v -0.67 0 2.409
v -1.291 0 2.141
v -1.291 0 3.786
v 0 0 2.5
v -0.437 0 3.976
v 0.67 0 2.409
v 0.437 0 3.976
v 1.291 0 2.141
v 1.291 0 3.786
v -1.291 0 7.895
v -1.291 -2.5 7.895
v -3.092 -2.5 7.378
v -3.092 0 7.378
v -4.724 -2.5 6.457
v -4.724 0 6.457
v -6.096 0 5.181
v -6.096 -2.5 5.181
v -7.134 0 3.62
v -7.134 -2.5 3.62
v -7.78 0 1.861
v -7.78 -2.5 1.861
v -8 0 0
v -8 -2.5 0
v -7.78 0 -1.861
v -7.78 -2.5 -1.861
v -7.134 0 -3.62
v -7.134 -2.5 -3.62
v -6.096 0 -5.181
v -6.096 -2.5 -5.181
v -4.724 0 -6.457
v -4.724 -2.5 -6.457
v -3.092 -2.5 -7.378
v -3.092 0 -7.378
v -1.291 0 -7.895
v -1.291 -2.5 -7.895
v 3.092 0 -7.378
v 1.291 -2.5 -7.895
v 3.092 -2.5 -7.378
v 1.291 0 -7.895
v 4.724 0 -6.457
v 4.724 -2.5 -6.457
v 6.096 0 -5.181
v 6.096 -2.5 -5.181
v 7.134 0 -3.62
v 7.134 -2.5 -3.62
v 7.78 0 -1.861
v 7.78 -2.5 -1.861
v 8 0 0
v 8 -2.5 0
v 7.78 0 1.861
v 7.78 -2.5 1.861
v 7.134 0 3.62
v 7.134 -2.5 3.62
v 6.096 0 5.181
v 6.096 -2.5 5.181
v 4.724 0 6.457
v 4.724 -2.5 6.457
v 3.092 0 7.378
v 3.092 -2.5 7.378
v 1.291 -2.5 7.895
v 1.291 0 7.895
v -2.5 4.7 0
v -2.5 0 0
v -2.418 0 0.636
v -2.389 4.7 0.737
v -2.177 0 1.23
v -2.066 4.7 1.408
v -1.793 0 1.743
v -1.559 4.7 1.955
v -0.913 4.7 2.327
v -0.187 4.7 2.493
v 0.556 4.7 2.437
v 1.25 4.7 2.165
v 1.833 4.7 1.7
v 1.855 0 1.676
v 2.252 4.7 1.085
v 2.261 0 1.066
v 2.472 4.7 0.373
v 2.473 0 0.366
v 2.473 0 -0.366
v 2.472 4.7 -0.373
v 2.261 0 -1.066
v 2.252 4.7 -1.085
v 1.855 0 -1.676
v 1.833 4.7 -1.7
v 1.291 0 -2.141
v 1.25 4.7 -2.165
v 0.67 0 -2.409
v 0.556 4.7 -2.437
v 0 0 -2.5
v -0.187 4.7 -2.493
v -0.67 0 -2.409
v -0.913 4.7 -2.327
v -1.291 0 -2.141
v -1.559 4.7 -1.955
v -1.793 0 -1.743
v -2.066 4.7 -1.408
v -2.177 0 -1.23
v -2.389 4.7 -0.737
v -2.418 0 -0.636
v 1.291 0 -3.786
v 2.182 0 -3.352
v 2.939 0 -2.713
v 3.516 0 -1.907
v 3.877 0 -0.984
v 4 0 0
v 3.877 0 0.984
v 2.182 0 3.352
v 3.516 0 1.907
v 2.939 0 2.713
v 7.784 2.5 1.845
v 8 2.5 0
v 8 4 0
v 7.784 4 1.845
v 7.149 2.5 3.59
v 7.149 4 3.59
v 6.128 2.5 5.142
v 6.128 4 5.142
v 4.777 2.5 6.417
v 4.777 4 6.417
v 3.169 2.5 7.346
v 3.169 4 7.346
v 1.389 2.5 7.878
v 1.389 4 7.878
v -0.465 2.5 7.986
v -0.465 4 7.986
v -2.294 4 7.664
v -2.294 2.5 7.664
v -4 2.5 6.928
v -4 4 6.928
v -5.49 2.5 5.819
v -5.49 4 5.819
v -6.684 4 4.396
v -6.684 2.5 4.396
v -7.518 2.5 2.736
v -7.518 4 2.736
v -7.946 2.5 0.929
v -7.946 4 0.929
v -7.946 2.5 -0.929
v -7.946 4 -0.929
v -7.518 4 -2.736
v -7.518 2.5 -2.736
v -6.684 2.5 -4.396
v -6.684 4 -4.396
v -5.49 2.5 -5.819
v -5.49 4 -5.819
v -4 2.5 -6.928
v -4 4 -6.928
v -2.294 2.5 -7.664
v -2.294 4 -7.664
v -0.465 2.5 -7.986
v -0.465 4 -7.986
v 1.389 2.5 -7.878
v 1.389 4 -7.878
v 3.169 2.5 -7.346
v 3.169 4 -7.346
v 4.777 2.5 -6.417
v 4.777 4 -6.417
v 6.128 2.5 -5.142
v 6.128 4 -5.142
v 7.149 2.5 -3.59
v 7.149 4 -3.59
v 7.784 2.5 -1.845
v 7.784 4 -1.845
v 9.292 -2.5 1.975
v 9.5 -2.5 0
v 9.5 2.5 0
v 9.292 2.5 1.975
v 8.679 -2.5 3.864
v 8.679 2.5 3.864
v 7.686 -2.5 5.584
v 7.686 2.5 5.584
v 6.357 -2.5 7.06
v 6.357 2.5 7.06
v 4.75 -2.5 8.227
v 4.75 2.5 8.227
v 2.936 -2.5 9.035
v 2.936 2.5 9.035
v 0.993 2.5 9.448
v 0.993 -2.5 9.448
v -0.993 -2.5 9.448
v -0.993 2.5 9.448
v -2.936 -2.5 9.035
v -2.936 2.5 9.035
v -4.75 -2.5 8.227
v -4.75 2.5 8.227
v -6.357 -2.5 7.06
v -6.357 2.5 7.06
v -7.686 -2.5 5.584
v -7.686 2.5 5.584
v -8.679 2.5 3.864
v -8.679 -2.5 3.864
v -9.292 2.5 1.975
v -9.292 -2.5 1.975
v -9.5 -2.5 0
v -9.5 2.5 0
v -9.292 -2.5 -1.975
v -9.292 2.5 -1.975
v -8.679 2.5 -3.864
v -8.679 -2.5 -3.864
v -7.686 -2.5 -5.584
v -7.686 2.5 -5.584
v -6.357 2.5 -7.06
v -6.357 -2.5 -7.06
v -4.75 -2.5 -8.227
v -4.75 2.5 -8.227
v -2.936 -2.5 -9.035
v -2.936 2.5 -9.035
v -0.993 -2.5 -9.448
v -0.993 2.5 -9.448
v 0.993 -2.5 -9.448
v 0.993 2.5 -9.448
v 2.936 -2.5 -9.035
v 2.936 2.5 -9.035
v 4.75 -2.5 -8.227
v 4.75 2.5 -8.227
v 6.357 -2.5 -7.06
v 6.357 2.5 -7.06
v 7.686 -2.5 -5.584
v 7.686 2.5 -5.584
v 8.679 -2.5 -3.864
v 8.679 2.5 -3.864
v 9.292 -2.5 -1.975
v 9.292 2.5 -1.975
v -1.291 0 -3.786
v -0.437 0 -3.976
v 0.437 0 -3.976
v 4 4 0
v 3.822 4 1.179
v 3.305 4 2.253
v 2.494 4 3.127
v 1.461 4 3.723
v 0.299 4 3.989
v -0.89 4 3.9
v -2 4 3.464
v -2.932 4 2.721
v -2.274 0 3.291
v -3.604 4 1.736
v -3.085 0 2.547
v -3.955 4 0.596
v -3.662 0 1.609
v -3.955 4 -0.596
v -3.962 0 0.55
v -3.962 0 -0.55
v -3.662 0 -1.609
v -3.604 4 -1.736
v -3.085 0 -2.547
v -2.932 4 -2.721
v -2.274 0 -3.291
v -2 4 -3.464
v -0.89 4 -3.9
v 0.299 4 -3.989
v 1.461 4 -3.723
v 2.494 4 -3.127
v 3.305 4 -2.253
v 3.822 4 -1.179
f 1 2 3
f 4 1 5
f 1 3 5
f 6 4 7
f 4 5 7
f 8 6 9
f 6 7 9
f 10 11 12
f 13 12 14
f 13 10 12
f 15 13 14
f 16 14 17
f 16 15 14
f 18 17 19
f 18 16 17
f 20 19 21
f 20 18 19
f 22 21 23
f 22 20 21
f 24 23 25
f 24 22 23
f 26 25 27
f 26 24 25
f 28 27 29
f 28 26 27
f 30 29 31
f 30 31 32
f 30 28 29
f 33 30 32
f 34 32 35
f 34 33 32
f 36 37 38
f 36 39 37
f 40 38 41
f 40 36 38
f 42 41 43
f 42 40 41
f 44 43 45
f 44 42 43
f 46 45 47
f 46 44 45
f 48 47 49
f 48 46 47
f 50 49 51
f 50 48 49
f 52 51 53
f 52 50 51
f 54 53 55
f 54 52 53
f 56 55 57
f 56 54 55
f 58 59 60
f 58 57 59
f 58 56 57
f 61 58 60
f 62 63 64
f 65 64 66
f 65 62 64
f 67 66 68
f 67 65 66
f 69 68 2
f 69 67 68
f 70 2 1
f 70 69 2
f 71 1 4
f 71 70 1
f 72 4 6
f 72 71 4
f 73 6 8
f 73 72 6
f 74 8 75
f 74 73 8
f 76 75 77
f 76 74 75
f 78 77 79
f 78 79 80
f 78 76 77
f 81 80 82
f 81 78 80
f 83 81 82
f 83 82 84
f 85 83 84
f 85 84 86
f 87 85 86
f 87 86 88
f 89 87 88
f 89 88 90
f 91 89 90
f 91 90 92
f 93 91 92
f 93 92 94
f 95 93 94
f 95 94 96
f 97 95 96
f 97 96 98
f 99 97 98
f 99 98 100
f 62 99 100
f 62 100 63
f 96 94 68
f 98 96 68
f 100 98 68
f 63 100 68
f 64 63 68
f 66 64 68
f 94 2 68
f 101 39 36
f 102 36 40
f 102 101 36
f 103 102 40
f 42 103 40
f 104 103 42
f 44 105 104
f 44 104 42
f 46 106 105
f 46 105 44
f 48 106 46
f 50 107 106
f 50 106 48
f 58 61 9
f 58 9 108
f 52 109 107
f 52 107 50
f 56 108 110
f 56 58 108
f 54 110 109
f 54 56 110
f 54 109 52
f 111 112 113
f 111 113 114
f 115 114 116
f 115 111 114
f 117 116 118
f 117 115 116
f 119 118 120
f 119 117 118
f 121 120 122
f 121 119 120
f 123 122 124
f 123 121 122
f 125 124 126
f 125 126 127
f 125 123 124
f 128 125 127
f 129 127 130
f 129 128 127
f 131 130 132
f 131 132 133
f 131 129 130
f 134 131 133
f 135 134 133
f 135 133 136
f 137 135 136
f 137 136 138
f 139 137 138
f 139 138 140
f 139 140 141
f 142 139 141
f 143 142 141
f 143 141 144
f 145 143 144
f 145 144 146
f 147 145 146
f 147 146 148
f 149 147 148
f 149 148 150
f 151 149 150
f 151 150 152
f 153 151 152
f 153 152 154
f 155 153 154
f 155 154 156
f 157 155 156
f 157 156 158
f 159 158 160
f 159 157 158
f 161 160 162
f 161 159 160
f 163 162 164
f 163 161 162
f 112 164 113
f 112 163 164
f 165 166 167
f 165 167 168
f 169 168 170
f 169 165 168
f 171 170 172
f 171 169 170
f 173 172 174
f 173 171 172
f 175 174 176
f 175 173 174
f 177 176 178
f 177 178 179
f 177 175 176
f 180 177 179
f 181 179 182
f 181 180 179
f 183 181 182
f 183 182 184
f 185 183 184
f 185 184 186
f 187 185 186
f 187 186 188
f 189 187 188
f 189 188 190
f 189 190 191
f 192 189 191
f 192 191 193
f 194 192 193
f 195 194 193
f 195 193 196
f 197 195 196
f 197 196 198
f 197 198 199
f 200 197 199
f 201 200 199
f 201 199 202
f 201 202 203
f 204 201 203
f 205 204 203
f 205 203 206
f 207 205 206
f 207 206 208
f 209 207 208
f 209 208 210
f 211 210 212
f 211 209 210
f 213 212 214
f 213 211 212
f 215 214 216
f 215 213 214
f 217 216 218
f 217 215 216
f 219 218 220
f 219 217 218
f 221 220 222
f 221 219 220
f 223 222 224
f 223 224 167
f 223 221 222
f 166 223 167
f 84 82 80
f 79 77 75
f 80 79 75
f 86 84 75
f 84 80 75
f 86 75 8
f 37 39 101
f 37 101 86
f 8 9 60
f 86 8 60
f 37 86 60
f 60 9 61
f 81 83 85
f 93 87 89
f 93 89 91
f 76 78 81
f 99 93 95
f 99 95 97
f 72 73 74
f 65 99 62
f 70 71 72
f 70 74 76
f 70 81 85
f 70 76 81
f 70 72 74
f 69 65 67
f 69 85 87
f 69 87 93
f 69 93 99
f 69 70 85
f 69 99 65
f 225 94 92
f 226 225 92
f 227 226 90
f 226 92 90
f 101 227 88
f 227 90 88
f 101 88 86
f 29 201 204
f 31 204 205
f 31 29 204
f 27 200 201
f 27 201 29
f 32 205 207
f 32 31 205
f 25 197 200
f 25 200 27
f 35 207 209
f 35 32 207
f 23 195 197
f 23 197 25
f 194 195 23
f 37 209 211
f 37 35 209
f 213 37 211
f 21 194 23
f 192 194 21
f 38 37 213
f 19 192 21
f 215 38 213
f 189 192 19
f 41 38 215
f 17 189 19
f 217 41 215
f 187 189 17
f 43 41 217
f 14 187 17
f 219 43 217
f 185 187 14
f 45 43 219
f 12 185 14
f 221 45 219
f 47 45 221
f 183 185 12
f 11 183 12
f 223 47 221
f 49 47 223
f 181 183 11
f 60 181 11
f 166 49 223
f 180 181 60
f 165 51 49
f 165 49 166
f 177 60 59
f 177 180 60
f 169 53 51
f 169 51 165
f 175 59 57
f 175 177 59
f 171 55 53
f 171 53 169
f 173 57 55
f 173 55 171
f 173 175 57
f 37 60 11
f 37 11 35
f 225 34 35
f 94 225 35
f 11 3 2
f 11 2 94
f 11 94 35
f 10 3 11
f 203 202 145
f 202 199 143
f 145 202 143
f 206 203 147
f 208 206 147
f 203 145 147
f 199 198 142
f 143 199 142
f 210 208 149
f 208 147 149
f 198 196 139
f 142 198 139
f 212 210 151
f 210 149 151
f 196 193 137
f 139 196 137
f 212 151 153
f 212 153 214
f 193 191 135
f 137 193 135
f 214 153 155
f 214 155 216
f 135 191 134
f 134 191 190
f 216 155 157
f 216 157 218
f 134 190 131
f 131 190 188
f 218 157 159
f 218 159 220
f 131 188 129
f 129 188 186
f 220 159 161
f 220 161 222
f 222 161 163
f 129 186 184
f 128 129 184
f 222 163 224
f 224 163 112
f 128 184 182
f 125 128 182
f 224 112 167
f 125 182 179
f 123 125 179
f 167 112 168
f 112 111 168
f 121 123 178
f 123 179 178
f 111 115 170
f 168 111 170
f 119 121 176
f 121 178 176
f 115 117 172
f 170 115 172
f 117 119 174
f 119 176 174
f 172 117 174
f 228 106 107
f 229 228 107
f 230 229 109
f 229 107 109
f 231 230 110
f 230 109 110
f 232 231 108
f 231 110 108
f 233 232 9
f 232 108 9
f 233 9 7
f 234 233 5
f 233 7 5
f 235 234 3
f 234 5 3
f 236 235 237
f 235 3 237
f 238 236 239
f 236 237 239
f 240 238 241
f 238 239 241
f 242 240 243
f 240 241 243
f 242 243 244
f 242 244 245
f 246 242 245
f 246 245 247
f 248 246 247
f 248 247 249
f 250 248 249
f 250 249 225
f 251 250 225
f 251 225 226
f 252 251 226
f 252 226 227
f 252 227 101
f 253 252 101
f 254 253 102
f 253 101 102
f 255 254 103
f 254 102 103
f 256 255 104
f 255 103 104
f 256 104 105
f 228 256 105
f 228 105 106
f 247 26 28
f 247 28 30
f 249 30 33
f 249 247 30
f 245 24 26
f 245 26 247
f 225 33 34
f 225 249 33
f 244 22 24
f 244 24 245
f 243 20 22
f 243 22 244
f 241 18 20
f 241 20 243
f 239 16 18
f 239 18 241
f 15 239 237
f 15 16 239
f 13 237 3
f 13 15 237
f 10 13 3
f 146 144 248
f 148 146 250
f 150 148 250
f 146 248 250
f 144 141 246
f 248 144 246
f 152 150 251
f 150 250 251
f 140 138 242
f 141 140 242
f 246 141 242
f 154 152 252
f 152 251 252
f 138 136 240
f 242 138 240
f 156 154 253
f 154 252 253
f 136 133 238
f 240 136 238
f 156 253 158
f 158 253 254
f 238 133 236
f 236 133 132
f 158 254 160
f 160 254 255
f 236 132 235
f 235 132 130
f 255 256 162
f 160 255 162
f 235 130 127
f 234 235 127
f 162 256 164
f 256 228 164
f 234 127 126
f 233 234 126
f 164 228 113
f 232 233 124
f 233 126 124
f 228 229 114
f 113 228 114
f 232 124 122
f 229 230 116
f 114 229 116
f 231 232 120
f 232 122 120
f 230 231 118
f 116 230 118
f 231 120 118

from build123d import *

# Parameters (mm, degrees)
F0_R        = 9.5
F0_R_2      = 8
F1_DEPTH    = 2.5
F2_W        = 2.5811996311
F2_H        = 16.6603792459
F1_FACE_R   = 9.5
F1_FACE_R_2 = 8
F3_DEPTH    = 2.5
F0_R_3      = 4
F4_DEPTH    = 4
F7_START    = -20.3
F6_R        = 2.5
F7_DEPTH    = 4.7


with BuildPart() as f1:
    # F0 (on Front) → F1 (new body, symmetric)
    with BuildSketch(Plane.XZ):
        Circle(F0_R)
        Circle(F0_R_2, mode=Mode.SUBTRACT)
    extrude(amount=F1_DEPTH, both=True)

    # F2 (on Front) + F1_face (on face) → F3 (join)
    with BuildSketch(Plane.XZ):
        Rectangle(F2_W, F2_H)
    with BuildSketch(Plane(origin=(0, 2.5, 0), x_dir=(1, 0, 0), z_dir=(0, 1, 0))):
        Circle(F1_FACE_R)
        Circle(F1_FACE_R_2, mode=Mode.SUBTRACT)
    extrude(amount=F3_DEPTH, dir=(0, -1, 0))

    # F0 (on Front) → F4 (join)
    with BuildSketch(Plane.XZ):
        Circle(F0_R_2)
        Circle(F0_R_3, mode=Mode.SUBTRACT)
    extrude(amount=-F4_DEPTH)

    # F6 (on offset) → F7 (join)
    with BuildSketch(Plane(origin=(0, 25, 0), x_dir=(-1, 0, 0), z_dir=(0, 1, 0)).offset(F7_START)):
        Circle(F6_R)
    extrude(amount=-F7_DEPTH)


solid = f1.part
